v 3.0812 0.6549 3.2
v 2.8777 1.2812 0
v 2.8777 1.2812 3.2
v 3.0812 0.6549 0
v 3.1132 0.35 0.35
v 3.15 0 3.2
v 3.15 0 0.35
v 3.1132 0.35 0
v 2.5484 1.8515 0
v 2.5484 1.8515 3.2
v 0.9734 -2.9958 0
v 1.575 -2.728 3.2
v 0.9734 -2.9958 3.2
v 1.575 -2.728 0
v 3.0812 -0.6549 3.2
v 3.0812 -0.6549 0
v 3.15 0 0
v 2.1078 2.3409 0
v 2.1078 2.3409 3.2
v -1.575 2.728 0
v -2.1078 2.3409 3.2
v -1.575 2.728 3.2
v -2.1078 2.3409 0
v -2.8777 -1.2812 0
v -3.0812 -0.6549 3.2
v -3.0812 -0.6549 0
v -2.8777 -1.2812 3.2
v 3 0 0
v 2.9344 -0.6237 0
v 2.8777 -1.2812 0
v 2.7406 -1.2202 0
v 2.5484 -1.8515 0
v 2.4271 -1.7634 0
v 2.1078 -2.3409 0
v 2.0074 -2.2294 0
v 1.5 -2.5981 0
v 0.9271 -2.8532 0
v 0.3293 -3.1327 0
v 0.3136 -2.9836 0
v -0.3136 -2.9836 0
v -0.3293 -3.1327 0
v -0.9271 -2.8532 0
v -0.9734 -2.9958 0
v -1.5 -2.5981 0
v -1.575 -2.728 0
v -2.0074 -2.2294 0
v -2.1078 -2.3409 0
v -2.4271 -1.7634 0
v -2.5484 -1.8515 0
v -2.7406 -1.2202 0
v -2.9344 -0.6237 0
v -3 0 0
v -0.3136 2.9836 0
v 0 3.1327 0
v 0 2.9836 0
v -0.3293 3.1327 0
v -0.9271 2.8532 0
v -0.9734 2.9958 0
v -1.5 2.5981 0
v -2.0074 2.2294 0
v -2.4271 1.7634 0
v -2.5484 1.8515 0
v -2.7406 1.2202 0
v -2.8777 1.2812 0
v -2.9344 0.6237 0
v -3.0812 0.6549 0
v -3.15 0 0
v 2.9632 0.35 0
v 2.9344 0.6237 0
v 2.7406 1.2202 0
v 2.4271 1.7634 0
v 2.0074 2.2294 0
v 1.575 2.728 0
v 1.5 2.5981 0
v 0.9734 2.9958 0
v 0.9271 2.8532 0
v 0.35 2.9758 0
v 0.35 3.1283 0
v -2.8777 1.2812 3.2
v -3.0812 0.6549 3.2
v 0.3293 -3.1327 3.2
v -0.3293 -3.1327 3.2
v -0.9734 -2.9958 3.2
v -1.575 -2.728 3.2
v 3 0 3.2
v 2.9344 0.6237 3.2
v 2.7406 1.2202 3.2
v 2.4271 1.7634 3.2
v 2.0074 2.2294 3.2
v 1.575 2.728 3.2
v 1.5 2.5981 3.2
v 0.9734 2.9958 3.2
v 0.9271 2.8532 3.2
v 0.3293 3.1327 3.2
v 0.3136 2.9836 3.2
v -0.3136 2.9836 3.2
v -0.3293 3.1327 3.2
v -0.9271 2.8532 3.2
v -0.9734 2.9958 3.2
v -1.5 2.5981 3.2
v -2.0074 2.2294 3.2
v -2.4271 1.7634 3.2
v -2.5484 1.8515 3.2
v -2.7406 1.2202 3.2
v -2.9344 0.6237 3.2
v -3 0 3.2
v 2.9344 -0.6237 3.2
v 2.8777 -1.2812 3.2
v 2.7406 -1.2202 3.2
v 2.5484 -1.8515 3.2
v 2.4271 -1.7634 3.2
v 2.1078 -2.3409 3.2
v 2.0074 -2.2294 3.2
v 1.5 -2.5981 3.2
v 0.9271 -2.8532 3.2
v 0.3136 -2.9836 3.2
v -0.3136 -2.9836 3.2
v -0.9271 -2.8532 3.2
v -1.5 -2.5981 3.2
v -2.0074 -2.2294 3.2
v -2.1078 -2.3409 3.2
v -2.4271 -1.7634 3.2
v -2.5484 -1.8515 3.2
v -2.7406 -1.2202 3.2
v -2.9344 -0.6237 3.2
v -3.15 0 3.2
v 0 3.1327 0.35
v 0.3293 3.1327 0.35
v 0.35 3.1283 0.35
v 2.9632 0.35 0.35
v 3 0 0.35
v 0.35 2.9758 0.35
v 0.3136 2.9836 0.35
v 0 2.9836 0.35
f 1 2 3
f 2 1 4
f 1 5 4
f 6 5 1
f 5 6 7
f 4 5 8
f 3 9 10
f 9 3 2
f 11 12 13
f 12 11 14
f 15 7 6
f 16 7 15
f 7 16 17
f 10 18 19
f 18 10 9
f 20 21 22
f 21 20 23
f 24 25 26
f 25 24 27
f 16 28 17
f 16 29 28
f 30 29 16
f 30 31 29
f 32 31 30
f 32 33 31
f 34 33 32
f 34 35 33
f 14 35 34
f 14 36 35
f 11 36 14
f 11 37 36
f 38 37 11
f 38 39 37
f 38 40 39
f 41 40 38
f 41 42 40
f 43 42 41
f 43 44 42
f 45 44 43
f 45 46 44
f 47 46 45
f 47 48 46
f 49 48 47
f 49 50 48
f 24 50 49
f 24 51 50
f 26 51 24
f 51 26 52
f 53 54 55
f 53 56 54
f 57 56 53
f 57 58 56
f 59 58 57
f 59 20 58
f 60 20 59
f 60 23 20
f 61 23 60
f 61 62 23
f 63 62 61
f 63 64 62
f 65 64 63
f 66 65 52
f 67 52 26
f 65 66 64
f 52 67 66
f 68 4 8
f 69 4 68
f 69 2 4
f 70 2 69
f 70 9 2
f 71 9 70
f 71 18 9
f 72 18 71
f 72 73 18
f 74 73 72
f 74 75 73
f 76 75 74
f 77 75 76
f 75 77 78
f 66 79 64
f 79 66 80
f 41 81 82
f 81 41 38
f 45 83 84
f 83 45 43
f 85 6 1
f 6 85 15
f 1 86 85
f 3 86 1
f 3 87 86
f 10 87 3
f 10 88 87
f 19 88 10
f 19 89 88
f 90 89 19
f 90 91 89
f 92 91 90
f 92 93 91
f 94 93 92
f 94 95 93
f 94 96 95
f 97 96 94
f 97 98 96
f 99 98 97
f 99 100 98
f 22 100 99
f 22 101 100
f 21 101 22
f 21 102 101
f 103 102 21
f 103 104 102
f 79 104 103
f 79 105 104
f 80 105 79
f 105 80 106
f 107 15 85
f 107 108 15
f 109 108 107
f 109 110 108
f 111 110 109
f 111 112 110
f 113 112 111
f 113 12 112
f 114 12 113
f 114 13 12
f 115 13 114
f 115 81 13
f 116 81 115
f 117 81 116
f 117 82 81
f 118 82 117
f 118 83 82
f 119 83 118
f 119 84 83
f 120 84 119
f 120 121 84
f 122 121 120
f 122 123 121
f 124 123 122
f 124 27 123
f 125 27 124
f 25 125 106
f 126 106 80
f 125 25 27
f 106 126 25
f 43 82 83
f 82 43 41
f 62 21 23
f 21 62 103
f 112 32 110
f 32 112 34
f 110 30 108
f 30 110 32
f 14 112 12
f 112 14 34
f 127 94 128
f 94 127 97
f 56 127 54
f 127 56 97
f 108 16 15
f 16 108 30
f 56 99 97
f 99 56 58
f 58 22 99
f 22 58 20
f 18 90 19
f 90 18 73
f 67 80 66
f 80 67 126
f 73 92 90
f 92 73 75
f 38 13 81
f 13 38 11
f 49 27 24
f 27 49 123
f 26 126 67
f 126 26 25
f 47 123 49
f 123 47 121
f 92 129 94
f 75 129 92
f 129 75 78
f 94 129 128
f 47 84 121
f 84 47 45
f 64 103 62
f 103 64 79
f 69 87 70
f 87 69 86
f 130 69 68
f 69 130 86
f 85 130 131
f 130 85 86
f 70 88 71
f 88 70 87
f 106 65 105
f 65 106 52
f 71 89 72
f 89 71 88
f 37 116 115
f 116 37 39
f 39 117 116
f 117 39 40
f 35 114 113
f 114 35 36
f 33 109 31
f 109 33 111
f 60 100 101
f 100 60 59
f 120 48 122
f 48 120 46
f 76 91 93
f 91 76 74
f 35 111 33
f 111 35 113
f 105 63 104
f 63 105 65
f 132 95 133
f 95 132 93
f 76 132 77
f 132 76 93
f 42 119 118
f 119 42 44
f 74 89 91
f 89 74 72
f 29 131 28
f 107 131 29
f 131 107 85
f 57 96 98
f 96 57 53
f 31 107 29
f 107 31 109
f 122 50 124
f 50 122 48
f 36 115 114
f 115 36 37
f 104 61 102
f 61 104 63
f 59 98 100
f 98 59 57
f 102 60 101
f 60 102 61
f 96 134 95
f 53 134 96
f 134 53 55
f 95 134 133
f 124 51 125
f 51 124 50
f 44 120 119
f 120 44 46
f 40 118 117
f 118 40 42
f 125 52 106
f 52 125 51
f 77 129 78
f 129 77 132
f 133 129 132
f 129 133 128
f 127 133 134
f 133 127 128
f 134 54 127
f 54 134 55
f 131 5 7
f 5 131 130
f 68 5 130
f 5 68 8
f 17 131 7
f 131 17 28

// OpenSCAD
// file: common.scad
/**
 * Derived from http://www.thingiverse.com/thing:5699
 *
 * LEGO, the LEGO logo, the Brick, DUPLO, and MINDSTORMS are trademarks of the LEGO Group. 2012 The LEGO Group.
 */

// LEGO standard dimensions - (no duplos)
// heights
block_height = 9.6;
plate_height = 9.6 / 3;

// pins and posts 
cylinder_precision = 0.1;
pin_diameter = 3.2;
post_diameter = 6.3;
post_wall_thickness = 0.45;

roof_thickness = 1;

stud_spacing = 8;

wall_play = 0.1;
wall_thickness = 1.45;


//
// cool hash function for structs
// dog = [
//  "fur", "black",
//  "legs", 4
// ];
// hash( dog, "legs")
//
function hash(h,k)= ( h[search([k], [for(i=[0:2:len(h)-2])h[i]])[0]*2+1] ); 
// main file
/**
 * Derived from http://www.thingiverse.com/thing:5699
 *
 * LEGO, the LEGO logo, the Brick, DUPLO, and MINDSTORMS are trademarks of the LEGO Group. 2012 The LEGO Group.
 */

include <common.scad>

// diameter: number
// type: plate, tile, brick
round(2, 2, "tile");

module round(width, length, type) {
  height = 1/3;
  groove_depth = 0.35;
  groove_height = 0.35;
  r = 5;
  h = 5;
    
  // calculate real dimensions based on stud count
  real_height = max(1/3, height);
  real_length = max(width, length);
  real_width = min(width, length);
  overall_length = (real_length * stud_spacing) - (2 * wall_play);
  overall_width = (real_width * stud_spacing) - (2 * wall_play);
  
  union() {
    // basic circle brick
    difference() {
      // block(real_height, overall_width, overall_length);
      difference() {
        // main circle part
        cylinder(r = post_diameter / 2, 
                 h = real_height * block_height, 
                 $fs = cylinder_precision);
        // carve out inside so stud can snap into it
        translate([0, 0, -0.5]) 
          cylinder(r = (post_diameter/2) - post_wall_thickness, 
                   h = real_height * block_height + 1,
                   $fs = cylinder_precision);
        
        cylinder(r = (post_diameter/2) - post_wall_thickness + .3, 
                 h = real_height * block_height + 1,
                 $fs = cylinder_precision);
      }
      
      // remove groove around bottom of brick, so easier to remove (newer style tile)
      cube([groove_depth, overall_width, groove_height]);
      cube([overall_length, groove_depth, groove_height]);
      translate([overall_length - groove_depth, 0, 0])
      cube([groove_depth, overall_width, groove_height]);
      translate([0, overall_width - groove_depth, 0])
      cube([overall_length, groove_depth, groove_height]);
    }
    // underneath posts or pins
    // posts(real_width, real_length, real_height, overall_width, overall_length);
  }
}
